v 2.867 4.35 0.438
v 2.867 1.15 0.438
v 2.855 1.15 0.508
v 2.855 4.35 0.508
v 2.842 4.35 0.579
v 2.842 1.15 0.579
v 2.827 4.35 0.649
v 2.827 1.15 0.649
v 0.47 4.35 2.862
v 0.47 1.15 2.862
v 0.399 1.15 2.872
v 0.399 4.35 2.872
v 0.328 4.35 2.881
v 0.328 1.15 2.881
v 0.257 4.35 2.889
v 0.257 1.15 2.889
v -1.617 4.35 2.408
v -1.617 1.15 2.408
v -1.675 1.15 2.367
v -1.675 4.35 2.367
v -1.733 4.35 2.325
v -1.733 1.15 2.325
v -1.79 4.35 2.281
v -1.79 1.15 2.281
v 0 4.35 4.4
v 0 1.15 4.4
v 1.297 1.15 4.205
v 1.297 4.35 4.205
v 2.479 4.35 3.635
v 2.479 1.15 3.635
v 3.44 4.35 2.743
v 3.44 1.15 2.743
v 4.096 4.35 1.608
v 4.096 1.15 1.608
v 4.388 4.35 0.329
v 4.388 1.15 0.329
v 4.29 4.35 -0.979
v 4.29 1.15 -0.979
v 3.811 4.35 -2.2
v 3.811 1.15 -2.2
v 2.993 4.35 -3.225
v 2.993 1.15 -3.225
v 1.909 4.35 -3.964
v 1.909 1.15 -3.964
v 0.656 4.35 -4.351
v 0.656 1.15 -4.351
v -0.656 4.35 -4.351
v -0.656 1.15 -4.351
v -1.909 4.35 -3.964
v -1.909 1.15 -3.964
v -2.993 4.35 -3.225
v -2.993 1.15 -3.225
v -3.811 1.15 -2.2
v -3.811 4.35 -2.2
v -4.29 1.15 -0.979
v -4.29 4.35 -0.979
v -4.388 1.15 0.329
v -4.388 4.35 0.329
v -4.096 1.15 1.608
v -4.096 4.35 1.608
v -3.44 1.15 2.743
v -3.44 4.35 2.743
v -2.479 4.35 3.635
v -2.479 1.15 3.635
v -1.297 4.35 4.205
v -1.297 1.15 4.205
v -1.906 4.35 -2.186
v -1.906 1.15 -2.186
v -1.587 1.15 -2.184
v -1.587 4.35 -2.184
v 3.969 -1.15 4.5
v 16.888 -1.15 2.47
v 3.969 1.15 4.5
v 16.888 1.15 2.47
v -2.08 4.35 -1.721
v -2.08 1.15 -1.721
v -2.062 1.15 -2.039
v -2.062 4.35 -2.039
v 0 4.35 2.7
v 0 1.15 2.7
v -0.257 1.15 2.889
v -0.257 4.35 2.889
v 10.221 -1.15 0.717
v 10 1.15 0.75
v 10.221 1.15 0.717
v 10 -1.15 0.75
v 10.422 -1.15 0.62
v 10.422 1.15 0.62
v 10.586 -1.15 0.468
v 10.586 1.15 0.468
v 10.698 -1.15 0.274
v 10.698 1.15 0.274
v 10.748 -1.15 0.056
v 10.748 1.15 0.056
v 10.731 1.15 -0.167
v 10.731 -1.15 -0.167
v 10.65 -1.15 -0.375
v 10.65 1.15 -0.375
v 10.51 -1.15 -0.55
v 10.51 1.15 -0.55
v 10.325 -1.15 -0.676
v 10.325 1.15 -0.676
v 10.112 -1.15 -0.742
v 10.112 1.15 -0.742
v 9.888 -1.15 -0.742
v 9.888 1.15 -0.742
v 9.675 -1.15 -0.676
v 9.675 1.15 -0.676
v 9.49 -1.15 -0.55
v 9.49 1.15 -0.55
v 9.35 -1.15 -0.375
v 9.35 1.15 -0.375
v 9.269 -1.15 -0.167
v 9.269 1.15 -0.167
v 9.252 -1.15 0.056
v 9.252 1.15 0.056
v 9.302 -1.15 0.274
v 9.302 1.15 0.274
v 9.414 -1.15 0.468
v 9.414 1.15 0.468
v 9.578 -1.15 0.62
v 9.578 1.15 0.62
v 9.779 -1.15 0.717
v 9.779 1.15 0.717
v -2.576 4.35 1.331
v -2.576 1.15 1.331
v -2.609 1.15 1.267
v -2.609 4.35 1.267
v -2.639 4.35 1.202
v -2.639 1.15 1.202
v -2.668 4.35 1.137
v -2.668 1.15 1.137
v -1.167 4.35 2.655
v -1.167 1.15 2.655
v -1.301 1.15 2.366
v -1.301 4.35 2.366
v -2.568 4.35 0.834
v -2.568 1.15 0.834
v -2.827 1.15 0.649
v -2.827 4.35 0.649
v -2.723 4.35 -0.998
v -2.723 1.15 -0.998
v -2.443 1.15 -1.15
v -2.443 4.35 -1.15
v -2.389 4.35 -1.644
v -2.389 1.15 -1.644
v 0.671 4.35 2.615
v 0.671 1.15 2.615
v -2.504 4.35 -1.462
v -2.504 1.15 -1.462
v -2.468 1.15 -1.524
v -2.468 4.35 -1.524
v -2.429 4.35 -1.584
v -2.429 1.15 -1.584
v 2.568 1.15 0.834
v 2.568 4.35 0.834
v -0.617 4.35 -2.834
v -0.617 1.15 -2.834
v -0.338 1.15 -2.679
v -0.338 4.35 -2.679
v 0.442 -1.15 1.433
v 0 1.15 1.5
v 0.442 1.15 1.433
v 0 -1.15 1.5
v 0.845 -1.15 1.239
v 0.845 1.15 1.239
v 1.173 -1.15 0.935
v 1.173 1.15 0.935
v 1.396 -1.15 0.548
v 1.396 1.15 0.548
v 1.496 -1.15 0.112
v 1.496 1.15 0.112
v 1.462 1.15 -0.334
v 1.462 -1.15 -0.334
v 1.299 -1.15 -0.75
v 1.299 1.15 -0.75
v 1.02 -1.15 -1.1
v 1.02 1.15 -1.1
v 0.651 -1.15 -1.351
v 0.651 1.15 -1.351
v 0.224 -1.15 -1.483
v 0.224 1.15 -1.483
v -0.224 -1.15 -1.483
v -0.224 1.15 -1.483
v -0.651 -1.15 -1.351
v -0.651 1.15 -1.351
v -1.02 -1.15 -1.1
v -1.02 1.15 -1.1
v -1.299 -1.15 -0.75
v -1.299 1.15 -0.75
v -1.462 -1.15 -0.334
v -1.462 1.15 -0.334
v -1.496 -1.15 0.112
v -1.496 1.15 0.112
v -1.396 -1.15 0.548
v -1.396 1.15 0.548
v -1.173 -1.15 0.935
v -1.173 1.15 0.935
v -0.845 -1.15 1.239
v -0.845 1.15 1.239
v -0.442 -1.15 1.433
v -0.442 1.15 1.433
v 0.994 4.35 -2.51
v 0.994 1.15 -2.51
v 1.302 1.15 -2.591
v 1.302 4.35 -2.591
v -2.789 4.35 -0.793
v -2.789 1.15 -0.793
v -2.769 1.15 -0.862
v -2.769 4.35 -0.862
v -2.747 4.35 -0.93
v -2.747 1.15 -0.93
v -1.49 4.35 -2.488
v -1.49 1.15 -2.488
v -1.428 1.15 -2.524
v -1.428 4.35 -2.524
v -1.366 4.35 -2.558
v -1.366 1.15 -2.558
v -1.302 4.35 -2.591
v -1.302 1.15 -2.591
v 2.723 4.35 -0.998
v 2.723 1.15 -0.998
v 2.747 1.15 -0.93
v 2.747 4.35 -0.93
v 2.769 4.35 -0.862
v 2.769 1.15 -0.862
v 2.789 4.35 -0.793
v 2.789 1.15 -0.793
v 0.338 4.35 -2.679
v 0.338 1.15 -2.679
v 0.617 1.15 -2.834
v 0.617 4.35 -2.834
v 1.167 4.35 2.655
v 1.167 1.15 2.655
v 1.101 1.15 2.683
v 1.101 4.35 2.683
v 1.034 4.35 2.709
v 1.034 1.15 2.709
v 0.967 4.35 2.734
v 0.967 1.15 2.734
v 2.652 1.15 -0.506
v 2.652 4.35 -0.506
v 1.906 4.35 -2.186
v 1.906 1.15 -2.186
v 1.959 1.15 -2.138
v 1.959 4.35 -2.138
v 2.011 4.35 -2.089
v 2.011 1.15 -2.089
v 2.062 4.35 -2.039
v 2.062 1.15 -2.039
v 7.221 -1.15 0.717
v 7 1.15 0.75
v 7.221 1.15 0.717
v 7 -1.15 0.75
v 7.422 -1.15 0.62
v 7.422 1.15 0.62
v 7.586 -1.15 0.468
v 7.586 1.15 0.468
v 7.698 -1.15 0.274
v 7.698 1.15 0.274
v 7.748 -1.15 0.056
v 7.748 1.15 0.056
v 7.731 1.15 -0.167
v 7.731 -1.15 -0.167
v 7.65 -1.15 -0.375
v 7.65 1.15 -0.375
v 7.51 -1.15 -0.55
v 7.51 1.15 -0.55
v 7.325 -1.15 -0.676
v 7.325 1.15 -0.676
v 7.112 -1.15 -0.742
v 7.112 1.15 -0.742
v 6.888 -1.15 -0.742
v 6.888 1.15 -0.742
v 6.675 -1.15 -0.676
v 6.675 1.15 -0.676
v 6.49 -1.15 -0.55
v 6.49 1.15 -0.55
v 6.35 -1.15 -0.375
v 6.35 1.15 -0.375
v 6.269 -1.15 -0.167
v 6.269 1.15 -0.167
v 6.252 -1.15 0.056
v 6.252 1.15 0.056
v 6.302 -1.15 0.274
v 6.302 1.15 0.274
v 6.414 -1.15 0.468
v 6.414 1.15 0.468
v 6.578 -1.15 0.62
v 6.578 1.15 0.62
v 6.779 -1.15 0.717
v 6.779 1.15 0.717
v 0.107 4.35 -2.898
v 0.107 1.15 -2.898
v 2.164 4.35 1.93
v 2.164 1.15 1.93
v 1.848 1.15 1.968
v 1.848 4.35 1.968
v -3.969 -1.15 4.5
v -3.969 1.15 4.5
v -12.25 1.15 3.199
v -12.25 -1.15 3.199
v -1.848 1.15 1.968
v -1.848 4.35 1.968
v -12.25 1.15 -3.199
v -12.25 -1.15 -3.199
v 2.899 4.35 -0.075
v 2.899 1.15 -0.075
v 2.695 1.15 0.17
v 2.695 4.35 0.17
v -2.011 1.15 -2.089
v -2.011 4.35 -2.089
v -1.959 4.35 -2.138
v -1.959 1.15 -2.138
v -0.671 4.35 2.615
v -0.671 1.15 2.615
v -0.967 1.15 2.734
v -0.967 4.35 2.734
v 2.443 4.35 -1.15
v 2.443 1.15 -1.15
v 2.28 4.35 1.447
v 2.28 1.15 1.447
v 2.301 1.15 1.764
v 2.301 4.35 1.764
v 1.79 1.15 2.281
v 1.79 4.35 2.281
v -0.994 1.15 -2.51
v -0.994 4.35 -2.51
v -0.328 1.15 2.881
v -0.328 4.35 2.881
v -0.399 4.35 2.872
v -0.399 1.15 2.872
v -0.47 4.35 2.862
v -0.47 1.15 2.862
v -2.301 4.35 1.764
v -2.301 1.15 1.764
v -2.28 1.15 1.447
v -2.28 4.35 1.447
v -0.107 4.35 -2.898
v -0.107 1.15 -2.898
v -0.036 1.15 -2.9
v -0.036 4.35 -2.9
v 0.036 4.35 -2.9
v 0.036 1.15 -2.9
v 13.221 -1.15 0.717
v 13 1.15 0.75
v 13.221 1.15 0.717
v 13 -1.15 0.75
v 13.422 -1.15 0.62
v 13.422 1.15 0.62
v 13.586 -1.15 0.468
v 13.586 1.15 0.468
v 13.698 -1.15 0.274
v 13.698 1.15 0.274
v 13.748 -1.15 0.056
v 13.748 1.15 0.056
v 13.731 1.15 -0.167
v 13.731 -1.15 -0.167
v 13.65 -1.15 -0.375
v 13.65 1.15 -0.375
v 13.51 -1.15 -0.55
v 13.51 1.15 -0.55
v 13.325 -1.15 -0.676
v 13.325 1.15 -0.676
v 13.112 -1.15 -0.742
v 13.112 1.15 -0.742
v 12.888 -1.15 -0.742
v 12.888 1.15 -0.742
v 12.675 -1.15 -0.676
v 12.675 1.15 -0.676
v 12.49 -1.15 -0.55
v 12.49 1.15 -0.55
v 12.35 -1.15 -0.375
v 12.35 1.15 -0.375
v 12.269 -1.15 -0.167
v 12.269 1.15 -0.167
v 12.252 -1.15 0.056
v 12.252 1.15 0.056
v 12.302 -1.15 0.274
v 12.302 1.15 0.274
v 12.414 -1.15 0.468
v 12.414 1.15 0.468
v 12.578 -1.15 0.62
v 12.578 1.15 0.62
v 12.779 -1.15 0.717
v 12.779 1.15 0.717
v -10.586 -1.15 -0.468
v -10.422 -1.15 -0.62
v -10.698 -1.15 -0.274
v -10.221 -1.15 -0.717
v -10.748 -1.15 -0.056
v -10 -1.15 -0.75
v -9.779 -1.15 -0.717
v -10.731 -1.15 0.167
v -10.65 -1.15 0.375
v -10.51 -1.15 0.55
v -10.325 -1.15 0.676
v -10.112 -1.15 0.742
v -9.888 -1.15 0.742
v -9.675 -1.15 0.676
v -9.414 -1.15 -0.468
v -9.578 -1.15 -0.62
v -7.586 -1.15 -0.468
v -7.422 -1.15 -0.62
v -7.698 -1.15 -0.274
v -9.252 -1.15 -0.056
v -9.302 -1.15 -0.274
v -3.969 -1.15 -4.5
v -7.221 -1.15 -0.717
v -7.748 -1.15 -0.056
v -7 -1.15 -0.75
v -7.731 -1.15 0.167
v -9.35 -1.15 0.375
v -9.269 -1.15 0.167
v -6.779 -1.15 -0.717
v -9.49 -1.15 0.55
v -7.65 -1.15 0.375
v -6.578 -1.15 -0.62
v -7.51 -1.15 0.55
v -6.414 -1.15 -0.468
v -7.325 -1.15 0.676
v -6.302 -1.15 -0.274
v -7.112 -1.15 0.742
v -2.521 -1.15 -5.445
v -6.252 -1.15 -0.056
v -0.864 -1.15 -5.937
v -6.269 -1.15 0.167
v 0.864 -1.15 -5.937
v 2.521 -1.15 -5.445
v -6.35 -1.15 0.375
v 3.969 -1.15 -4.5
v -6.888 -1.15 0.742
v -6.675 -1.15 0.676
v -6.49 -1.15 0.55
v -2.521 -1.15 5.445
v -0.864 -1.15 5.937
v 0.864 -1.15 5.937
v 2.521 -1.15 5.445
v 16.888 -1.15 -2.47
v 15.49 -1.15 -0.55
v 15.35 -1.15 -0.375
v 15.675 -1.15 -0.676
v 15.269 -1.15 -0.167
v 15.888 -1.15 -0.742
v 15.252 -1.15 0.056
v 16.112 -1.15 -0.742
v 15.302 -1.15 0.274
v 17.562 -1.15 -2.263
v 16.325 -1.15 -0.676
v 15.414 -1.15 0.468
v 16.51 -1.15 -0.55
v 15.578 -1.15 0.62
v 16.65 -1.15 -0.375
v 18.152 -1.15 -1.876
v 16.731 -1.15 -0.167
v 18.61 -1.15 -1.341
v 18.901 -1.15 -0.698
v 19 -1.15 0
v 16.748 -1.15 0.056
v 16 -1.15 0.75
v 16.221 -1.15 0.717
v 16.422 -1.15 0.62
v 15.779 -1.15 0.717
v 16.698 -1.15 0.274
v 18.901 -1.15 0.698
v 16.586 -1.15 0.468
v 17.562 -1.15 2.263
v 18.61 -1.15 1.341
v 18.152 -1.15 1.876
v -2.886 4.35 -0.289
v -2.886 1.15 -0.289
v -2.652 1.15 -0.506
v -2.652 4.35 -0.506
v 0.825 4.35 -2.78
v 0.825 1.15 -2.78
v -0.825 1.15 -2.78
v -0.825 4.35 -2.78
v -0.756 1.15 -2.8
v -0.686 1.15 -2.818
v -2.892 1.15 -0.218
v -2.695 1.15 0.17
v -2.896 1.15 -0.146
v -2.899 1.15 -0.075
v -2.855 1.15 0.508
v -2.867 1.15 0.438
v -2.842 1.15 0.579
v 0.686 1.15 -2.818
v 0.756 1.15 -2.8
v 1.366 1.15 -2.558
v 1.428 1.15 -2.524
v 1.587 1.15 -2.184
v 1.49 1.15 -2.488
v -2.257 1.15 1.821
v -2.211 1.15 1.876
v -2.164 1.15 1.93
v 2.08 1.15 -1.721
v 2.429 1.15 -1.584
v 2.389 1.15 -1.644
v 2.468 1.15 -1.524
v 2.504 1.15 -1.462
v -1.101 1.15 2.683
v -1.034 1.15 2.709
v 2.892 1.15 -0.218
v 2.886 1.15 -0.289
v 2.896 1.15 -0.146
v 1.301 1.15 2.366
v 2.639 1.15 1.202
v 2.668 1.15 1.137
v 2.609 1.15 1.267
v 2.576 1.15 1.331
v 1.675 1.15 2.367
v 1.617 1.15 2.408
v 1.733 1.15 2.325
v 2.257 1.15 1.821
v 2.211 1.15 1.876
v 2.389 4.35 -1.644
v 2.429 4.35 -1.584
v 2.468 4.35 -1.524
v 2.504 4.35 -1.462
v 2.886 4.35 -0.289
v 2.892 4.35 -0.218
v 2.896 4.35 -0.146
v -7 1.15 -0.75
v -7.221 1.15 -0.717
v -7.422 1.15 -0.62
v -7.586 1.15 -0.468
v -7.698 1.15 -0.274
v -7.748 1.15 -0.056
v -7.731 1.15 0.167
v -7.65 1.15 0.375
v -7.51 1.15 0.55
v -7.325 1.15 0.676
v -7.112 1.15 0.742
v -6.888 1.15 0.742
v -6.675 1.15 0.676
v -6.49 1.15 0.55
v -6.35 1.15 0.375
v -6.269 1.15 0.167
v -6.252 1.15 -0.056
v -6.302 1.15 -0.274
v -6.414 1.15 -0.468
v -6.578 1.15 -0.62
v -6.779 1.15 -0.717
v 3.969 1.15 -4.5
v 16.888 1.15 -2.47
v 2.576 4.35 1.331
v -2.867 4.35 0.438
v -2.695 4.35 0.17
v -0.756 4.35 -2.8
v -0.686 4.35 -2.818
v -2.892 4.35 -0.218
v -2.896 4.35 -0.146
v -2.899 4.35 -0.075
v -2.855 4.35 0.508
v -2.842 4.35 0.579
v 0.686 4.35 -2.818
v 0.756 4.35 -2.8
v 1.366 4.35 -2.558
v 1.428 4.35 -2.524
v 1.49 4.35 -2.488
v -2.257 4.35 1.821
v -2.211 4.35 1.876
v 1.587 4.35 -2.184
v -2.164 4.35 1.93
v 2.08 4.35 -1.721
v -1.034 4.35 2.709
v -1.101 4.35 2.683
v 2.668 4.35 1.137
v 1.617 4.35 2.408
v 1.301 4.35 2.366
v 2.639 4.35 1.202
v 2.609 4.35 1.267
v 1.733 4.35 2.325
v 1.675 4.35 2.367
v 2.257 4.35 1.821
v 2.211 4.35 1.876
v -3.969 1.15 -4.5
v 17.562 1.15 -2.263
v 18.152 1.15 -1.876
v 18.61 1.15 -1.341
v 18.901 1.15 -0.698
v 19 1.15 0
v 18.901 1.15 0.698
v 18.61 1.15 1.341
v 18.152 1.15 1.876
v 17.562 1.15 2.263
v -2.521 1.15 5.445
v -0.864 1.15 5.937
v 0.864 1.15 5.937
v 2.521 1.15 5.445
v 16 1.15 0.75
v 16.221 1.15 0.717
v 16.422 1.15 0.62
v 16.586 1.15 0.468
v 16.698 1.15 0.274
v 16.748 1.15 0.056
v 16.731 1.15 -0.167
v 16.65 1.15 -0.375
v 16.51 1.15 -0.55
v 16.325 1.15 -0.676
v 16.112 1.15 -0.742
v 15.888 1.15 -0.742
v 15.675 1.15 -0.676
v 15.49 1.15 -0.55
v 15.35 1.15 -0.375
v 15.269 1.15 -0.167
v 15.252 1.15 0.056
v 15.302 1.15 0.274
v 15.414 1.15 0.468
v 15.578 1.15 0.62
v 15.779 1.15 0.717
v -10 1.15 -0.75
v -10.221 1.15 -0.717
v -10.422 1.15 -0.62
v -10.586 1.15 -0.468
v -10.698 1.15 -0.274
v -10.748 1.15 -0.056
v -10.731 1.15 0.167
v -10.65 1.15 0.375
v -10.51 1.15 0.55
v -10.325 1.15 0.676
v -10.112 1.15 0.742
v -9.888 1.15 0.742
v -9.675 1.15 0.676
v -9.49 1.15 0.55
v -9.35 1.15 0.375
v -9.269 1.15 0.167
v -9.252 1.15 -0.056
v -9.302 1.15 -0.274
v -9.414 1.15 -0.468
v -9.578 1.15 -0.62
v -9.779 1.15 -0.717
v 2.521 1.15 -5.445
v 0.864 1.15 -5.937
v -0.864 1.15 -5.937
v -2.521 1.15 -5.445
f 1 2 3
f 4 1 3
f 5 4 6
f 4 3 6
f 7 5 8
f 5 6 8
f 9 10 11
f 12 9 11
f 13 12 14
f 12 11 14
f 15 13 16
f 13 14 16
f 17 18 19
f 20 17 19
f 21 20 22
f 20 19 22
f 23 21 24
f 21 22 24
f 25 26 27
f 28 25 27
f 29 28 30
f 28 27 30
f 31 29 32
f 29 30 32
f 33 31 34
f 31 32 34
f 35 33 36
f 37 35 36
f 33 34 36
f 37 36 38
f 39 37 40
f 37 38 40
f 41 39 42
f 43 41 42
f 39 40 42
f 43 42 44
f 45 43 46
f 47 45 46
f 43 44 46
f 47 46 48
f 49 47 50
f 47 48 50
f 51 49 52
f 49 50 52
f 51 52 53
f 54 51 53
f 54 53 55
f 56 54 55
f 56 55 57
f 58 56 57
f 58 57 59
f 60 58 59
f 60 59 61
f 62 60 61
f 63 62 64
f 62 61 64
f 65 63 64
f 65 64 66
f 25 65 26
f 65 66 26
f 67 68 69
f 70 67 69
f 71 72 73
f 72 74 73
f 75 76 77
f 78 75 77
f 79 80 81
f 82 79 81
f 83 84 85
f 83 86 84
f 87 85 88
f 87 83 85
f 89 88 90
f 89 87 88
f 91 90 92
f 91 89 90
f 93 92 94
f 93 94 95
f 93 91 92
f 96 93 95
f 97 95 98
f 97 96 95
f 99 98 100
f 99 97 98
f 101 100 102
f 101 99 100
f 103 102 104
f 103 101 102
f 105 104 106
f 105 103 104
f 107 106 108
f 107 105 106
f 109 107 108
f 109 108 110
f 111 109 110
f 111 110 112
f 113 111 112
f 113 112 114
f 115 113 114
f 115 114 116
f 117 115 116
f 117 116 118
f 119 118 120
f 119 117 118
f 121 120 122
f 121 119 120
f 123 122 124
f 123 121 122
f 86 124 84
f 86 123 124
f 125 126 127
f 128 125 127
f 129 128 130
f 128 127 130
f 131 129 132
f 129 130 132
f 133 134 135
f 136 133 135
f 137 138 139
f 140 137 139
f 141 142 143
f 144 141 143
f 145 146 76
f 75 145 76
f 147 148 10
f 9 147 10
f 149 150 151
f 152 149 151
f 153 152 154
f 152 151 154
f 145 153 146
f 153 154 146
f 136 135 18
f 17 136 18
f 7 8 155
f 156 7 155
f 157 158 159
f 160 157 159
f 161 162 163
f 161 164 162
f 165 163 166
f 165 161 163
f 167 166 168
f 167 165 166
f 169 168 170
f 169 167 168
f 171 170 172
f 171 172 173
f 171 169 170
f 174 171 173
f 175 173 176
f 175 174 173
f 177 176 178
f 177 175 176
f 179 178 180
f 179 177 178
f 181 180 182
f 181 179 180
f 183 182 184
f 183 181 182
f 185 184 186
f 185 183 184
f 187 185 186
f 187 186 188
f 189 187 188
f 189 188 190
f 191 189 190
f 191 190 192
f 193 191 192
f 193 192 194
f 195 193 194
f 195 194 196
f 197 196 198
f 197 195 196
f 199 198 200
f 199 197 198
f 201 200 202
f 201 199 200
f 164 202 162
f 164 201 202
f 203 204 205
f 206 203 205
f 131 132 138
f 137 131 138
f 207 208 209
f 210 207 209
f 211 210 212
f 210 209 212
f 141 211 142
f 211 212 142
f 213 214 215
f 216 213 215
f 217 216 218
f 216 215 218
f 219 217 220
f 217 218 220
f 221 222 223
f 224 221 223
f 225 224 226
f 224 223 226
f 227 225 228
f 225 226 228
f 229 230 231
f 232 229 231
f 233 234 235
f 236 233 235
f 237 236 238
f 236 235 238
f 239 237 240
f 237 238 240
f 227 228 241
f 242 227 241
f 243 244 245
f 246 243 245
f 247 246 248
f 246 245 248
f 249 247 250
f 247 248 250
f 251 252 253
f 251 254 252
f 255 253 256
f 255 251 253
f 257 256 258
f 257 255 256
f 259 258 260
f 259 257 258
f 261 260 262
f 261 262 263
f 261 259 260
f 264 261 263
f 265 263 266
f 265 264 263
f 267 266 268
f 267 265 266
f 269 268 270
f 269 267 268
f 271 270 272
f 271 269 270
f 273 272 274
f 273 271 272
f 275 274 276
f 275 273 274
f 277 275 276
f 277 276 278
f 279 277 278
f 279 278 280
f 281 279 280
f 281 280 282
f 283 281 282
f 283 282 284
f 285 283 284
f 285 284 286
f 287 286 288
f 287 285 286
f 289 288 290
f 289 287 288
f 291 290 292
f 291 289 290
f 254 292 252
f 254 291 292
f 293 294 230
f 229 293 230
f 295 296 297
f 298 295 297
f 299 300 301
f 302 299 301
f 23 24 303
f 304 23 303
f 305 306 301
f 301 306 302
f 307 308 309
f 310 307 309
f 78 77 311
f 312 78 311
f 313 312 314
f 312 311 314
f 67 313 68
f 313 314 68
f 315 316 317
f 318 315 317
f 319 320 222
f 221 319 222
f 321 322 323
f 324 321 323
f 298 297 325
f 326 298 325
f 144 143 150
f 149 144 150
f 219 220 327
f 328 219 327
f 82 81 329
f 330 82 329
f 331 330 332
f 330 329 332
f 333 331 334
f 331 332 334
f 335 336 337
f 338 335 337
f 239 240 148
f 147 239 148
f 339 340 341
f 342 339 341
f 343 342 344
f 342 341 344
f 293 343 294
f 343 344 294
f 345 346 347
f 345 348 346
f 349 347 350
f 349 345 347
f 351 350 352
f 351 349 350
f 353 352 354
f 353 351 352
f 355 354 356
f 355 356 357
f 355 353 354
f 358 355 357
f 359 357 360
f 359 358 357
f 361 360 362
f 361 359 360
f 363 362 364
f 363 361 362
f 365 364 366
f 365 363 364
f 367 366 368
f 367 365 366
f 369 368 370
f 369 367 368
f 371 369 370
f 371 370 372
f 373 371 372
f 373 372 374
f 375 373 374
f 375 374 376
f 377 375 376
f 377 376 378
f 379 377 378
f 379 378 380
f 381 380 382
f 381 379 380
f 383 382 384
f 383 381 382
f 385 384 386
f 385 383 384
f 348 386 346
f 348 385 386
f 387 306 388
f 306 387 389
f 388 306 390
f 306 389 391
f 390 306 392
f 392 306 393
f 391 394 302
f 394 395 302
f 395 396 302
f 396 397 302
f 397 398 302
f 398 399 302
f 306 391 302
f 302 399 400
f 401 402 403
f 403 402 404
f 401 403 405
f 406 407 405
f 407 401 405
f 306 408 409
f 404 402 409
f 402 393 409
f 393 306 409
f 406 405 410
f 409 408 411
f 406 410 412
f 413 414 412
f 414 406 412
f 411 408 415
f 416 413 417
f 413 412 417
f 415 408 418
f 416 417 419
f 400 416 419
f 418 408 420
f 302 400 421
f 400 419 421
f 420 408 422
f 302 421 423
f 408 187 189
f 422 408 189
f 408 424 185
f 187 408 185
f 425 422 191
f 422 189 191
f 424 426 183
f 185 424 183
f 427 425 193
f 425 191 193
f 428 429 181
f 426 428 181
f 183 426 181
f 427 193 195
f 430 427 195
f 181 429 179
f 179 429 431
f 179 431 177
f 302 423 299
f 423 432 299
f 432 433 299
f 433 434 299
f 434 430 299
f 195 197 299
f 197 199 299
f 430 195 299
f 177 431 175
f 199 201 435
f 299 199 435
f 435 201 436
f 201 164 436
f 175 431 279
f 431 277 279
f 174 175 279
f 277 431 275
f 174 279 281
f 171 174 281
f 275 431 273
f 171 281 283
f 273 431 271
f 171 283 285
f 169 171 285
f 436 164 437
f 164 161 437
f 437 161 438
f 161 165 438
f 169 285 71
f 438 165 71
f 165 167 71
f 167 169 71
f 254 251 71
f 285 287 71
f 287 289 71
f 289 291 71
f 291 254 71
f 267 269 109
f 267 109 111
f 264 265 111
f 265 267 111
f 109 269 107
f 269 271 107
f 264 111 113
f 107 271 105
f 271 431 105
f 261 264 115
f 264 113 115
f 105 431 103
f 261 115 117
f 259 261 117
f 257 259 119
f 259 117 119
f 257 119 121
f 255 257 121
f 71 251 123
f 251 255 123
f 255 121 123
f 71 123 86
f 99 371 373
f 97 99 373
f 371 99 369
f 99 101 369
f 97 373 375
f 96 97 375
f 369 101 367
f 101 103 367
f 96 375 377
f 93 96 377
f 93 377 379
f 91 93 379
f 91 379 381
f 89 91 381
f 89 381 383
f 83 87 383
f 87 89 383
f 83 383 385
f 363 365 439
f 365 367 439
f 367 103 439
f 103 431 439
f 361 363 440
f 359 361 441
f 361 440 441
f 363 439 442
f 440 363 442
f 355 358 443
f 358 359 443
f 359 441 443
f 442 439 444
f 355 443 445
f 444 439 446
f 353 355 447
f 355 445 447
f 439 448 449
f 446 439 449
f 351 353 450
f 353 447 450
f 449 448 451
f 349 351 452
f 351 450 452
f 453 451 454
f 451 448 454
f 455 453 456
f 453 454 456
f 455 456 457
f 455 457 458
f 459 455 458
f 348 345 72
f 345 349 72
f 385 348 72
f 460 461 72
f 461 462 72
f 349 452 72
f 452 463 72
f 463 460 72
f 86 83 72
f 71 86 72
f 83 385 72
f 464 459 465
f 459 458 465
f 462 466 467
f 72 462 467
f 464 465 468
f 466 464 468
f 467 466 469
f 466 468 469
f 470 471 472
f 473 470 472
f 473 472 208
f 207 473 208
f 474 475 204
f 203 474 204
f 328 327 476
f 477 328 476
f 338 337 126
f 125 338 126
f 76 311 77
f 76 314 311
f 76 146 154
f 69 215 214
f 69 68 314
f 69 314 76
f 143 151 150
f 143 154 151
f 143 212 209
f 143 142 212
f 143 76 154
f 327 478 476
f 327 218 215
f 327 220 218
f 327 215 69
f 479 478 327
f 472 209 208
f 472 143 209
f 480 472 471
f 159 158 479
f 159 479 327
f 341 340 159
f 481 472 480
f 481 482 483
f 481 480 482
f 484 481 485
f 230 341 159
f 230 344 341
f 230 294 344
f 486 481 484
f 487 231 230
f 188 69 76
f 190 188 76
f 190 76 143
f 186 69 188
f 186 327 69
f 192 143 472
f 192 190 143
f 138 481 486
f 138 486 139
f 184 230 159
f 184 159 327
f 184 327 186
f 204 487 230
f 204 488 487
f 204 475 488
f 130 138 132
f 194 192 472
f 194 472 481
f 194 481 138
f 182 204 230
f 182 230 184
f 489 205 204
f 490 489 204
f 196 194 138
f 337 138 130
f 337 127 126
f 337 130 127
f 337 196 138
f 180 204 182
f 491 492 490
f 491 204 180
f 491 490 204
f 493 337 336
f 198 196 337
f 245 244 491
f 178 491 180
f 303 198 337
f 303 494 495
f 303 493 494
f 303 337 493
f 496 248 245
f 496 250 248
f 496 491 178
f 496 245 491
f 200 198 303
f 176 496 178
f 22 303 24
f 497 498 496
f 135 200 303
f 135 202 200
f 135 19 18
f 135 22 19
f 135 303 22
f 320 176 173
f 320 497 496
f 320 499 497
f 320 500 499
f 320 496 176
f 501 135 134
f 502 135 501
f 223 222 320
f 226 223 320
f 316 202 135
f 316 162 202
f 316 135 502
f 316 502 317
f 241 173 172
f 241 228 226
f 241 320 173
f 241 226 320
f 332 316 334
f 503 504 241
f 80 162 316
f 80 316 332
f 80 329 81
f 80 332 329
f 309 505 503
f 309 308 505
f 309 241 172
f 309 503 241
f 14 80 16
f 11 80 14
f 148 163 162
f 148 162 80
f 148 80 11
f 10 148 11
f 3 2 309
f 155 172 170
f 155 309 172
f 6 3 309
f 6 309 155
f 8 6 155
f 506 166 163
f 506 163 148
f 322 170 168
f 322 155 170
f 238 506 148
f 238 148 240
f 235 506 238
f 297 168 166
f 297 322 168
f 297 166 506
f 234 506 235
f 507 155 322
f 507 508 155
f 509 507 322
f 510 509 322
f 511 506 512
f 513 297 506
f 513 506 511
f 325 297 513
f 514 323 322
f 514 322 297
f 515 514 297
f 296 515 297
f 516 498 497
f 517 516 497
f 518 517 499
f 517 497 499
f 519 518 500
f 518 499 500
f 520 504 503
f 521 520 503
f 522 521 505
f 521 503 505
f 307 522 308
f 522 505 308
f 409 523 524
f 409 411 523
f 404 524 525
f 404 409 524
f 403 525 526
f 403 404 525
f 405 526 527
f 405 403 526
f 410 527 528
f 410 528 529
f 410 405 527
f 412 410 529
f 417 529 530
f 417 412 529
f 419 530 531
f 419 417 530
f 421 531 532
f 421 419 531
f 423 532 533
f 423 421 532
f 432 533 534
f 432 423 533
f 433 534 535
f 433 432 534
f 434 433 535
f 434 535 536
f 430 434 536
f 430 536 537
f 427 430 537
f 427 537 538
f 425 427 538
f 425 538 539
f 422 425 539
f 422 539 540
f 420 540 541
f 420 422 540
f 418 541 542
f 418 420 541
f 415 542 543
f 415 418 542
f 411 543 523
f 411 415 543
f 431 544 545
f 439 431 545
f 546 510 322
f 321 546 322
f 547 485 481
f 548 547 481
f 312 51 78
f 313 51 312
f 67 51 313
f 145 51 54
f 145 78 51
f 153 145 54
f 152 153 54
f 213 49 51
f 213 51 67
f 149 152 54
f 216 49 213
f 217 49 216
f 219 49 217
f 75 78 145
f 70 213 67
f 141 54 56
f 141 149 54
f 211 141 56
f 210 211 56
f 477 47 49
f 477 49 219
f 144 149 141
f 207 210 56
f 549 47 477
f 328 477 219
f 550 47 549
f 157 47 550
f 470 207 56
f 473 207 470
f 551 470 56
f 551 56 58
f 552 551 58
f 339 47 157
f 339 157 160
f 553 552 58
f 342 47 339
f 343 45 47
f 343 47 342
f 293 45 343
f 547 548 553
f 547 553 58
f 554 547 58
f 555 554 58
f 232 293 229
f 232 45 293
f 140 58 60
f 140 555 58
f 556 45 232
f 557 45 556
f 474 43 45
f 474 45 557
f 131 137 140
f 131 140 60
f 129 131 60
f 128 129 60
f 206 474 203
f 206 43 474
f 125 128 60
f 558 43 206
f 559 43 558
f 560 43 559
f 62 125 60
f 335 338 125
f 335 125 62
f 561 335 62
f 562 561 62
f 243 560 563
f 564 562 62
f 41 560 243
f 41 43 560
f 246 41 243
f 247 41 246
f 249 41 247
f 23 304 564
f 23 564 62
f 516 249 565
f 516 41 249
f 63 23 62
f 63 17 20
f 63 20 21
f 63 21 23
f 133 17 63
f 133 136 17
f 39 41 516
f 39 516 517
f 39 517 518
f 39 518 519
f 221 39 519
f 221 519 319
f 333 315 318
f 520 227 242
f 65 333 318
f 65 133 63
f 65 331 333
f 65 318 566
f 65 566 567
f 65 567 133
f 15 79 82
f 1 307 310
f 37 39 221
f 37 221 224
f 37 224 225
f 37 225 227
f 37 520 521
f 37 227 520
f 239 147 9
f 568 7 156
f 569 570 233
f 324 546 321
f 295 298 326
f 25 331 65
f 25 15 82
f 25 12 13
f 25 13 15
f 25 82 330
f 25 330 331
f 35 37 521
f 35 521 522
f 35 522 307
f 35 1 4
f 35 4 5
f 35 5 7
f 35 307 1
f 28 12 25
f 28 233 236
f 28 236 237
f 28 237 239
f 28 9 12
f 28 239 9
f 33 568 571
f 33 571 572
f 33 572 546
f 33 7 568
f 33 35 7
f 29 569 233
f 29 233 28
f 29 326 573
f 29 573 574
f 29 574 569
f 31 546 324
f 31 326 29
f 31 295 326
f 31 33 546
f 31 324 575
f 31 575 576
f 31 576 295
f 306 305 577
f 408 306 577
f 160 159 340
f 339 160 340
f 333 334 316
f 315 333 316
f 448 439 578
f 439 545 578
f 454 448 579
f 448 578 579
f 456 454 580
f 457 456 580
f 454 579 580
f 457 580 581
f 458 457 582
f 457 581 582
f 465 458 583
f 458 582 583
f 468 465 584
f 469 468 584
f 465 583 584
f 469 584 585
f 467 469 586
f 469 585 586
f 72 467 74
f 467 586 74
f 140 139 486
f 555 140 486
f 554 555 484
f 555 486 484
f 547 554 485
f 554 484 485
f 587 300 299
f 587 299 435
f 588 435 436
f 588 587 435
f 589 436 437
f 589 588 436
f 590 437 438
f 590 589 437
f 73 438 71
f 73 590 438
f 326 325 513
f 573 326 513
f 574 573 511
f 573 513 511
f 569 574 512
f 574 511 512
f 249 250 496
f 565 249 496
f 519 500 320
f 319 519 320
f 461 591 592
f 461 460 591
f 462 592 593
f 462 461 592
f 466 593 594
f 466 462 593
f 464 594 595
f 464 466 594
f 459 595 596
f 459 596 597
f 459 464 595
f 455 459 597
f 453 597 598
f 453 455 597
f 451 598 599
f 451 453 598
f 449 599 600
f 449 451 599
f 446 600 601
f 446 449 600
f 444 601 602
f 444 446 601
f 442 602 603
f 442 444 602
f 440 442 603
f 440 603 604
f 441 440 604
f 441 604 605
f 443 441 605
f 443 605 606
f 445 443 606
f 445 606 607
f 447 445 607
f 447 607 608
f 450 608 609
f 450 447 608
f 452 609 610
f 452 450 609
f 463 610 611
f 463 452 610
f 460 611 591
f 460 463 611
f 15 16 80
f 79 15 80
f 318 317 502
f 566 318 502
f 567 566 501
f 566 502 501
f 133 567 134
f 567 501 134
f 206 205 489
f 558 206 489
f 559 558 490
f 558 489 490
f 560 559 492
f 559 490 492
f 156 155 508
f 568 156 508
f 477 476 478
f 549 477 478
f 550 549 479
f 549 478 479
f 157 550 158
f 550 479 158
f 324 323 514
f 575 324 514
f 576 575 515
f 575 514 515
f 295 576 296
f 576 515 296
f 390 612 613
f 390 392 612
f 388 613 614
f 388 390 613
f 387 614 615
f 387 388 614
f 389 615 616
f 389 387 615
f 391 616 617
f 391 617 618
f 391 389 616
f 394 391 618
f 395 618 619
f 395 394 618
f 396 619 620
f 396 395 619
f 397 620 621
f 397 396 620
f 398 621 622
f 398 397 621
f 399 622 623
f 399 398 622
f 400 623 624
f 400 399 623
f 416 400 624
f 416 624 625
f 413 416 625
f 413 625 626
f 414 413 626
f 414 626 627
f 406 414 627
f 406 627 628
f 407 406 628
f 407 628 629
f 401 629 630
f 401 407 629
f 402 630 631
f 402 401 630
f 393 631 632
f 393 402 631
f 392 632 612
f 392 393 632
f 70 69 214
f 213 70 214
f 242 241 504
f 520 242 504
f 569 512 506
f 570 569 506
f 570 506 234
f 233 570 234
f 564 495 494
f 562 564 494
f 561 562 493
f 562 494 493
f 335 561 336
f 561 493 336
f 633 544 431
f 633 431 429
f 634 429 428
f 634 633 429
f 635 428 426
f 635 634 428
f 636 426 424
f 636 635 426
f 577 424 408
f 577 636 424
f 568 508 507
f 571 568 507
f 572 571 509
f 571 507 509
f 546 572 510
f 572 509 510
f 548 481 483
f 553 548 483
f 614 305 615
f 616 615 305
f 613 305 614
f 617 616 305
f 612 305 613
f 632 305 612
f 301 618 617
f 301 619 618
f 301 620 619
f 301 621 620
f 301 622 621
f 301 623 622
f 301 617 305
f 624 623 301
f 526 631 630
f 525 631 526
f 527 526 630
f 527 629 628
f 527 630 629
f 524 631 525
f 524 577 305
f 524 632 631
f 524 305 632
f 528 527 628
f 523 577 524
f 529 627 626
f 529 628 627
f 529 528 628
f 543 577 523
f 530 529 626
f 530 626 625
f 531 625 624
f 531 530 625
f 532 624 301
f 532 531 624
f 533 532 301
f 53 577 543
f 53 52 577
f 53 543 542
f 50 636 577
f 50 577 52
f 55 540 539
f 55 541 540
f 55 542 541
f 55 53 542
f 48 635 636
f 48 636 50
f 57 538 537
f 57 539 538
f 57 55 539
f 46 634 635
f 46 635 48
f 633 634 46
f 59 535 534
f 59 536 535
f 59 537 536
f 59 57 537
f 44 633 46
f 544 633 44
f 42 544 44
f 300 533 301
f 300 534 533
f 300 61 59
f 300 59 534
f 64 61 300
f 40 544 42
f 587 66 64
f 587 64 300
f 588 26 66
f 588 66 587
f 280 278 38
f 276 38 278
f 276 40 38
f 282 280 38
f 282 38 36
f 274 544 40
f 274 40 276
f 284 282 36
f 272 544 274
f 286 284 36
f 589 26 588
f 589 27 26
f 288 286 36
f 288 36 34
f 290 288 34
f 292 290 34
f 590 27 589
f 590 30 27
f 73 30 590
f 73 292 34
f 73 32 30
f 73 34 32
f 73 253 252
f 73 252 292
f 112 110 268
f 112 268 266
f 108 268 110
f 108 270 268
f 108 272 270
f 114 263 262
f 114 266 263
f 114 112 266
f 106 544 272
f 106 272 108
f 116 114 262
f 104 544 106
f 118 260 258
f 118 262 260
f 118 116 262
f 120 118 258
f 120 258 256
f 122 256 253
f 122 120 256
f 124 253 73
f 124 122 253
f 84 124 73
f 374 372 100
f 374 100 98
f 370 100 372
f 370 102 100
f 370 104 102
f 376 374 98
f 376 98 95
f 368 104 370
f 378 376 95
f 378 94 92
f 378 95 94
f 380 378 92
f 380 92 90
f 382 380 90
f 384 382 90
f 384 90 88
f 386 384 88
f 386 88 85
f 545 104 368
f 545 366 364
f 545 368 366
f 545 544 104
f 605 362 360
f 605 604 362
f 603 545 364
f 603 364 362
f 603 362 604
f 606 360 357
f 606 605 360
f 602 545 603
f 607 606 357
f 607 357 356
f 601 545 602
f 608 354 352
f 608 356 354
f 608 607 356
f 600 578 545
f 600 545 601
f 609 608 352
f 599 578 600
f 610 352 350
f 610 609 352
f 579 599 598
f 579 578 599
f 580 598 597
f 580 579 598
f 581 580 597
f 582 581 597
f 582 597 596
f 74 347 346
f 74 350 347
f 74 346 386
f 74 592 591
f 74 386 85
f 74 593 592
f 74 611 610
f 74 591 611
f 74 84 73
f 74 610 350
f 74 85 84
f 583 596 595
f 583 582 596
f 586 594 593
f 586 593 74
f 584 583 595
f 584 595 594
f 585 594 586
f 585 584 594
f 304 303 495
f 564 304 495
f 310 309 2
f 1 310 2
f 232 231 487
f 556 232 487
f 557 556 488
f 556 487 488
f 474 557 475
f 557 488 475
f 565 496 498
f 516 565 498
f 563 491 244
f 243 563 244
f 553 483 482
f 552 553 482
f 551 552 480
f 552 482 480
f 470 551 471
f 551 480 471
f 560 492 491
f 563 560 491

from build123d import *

# Parameters (mm, degrees)
SKETCH2_R           = 6
SKETCH2_R_2         = 1.5
BOSS_EXTRUDE1_DEPTH = 1.15
SKETCH3_R           = 4.4
BOSS_EXTRUDE2_DEPTH = 3.2
SKETCH4_R           = 0.75
BOSS_EXTRUDE3_DEPTH = 1.15
CIRPATTERN1_COUNT   = 2
CUT_EXTRUDE1_DEPTH  = 10


with BuildPart() as part:
    # Sketch2 → Boss-Extrude1 (new, symmetric)
    with BuildSketch(Plane(origin=(0, 0, 0), x_dir=(1, 0, 0), z_dir=(0, 1, 0))):
        with Locations(Location((0, 0, 0), (0, 0, 270))):
            Circle(SKETCH2_R)
        with Locations(Location((0, 0, 0), (0, 0, 270))):
            Circle(SKETCH2_R_2, mode=Mode.SUBTRACT)
    extrude(amount=BOSS_EXTRUDE1_DEPTH, both=True)

    # Sketch3 → Boss-Extrude2 (add)
    with BuildSketch(Plane(origin=(0, 1.15, 0), x_dir=(1, 0, 0), z_dir=(0, 1, 0))):
        with Locations(Location((0, 0, 0), (0, 0, 270))):
            Circle(SKETCH3_R)
        with BuildLine():
            Line((0.107421435, 2.898009771), (0.338399731, 2.678709694))
            Line((0.338399731, 2.678709694), (0.61665913, 2.83367809))
            ThreePointArc((0.61665913, 2.83367809), (0.721200673, 2.808891167), (0.824752316, 2.780248841))
            Line((0.824752316, 2.780248841), (0.993936292, 2.510396512))
            Line((0.993936292, 2.510396512), (1.301992734, 2.591295993))
            ThreePointArc((1.301992734, 2.591295993), (1.397085655, 2.541289372), (1.490260976, 2.48779465))
            Line((1.490260976, 2.48779465), (1.587020181, 2.184345885))
            Line((1.587020181, 2.184345885), (1.905517346, 2.186093238))
            ThreePointArc((1.905517346, 2.186093238), (1.985186607, 2.11400902), (2.062131058, 2.039023173))
            Line((2.062131058, 2.039023173), (2.080385755, 1.721044772))
            Line((2.080385755, 1.721044772), (2.389311295, 1.643530205))
            ThreePointArc((2.389311295, 1.643530205), (2.448550984, 1.553897705), (2.504429862, 1.46213237))
            Line((2.504429862, 1.46213237), (2.443033042, 1.149604087))
            Line((2.443033042, 1.149604087), (2.722976028, 0.997698125))
            ThreePointArc((2.722976028, 0.997698125), (2.758063897, 0.896149284), (2.789366126, 0.793370413))
            Line((2.789366126, 0.793370413), (2.652175577, 0.505929549))
            Line((2.652175577, 0.505929549), (2.885546163, 0.289177003))
            ThreePointArc((2.885546163, 0.289177003), (2.894277512, 0.182092507), (2.899036259, 0.074758075))
            Line((2.899036259, 0.074758075), (2.694672167, -0.169534403))
            Line((2.694672167, -0.169534403), (2.866806821, -0.437514174))
            ThreePointArc((2.866806821, -0.437514174), (2.848633027, -0.543405812), (2.826549281, -0.648551587))
            Line((2.826549281, -0.648551587), (2.567852594, -0.834345885))
            Line((2.567852594, -0.834345885), (2.667935462, -1.136714727))
            ThreePointArc((2.667935462, -1.136714727), (2.623998452, -1.234759946), (2.576459817, -1.331110368))
            Line((2.576459817, -1.331110368), (2.279685399, -1.446732346))
            Line((2.279685399, -1.446732346), (2.301427906, -1.764491312))
            ThreePointArc((2.301427906, -1.764491312), (2.234488404, -1.84852957), (2.164481907, -1.930030589))
            Line((2.164481907, -1.930030589), (1.848277186, -1.968215294))
            Line((1.848277186, -1.968215294), (1.790313171, -2.281398419))
            ThreePointArc((1.790313171, -2.281398419), (1.704577232, -2.346149284), (1.616501638, -2.40767989))
            Line((1.616501638, -2.40767989), (1.30073492, -2.366028036))
            Line((1.30073492, -2.366028036), (1.166706475, -2.654956874))
            ThreePointArc((1.166706475, -2.654956874), (1.067561203, -2.696351809), (0.966950626, -2.734045809))
            Line((0.966950626, -2.734045809), (0.671462695, -2.615174535))
            Line((0.671462695, -2.615174535), (0.469791321, -2.861694623))
            ThreePointArc((0.469791321, -2.861694623), (0.363466377, -2.877132634), (0.25664255, -2.888621575))
            Line((0.25664255, -2.888621575), (0, -2.7))
            Line((0, -2.7), (-0.25664255, -2.888621575))
            ThreePointArc((-0.25664255, -2.888621575), (-0.363466377, -2.877132634), (-0.469791321, -2.861694623))
            Line((-0.469791321, -2.861694623), (-0.671462695, -2.615174535))
            Line((-0.671462695, -2.615174535), (-0.966950626, -2.734045809))
            ThreePointArc((-0.966950626, -2.734045809), (-1.067561203, -2.696351809), (-1.166706475, -2.654956874))
            Line((-1.166706475, -2.654956874), (-1.30073492, -2.366028036))
            Line((-1.30073492, -2.366028036), (-1.616501638, -2.40767989))
            ThreePointArc((-1.616501638, -2.40767989), (-1.704577232, -2.346149284), (-1.790313171, -2.281398419))
            Line((-1.790313171, -2.281398419), (-1.848277186, -1.968215294))
            Line((-1.848277186, -1.968215294), (-2.164481907, -1.930030589))
            ThreePointArc((-2.164481907, -1.930030589), (-2.234488404, -1.84852957), (-2.301427906, -1.764491312))
            Line((-2.301427906, -1.764491312), (-2.279685399, -1.446732346))
            Line((-2.279685399, -1.446732346), (-2.576459817, -1.331110368))
            ThreePointArc((-2.576459817, -1.331110368), (-2.623998452, -1.234759946), (-2.667935462, -1.136714727))
            Line((-2.667935462, -1.136714727), (-2.567852594, -0.834345885))
            Line((-2.567852594, -0.834345885), (-2.826549281, -0.648551587))
            ThreePointArc((-2.826549281, -0.648551587), (-2.848633027, -0.543405812), (-2.866806821, -0.437514174))
            Line((-2.866806821, -0.437514174), (-2.694672167, -0.169534403))
            Line((-2.694672167, -0.169534403), (-2.899036259, 0.074758075))
            ThreePointArc((-2.899036259, 0.074758075), (-2.894277512, 0.182092507), (-2.885546163, 0.289177003))
            Line((-2.885546163, 0.289177003), (-2.652175577, 0.505929549))
            Line((-2.652175577, 0.505929549), (-2.789366126, 0.793370413))
            ThreePointArc((-2.789366126, 0.793370413), (-2.758063897, 0.896149284), (-2.722976028, 0.997698125))
            Line((-2.722976028, 0.997698125), (-2.443033042, 1.149604087))
            Line((-2.443033042, 1.149604087), (-2.504429862, 1.46213237))
            ThreePointArc((-2.504429862, 1.46213237), (-2.448550984, 1.553897705), (-2.389311295, 1.643530205))
            Line((-2.389311295, 1.643530205), (-2.080385755, 1.721044772))
            Line((-2.080385755, 1.721044772), (-2.062131058, 2.039023173))
            ThreePointArc((-2.062131058, 2.039023173), (-1.985186607, 2.11400902), (-1.905517346, 2.186093238))
            Line((-1.905517346, 2.186093238), (-1.587020181, 2.184345885))
            Line((-1.587020181, 2.184345885), (-1.490260976, 2.48779465))
            ThreePointArc((-1.490260976, 2.48779465), (-1.397085655, 2.541289372), (-1.301992734, 2.591295993))
            Line((-1.301992734, 2.591295993), (-0.993936292, 2.510396512))
            Line((-0.993936292, 2.510396512), (-0.824752316, 2.780248841))
            ThreePointArc((-0.824752316, 2.780248841), (-0.721200673, 2.808891167), (-0.61665913, 2.83367809))
            Line((-0.61665913, 2.83367809), (-0.338399731, 2.678709694))
            Line((-0.338399731, 2.678709694), (-0.107421435, 2.898009771))
            ThreePointArc((-0.107421435, 2.898009771), (0, 2.9), (0.107421435, 2.898009771))
        make_face(mode=Mode.SUBTRACT)
    extrude(amount=BOSS_EXTRUDE2_DEPTH)

    # Sketch4 → Boss-Extrude3 (add, symmetric)
    with BuildSketch(Plane(origin=(0, 0, 0), x_dir=(1, 0, 0), z_dir=(0, 1, 0))):
        with BuildLine():
            Line((3.968626967, 4.5), (16.888114198, 2.469689731))
            ThreePointArc((16.888114198, 2.469689731), (19, 0), (16.888114198, -2.469689731))
            Line((16.888114198, -2.469689731), (3.968626967, -4.5))
            ThreePointArc((3.968626967, -4.5), (6, 0), (3.968626967, 4.5))
        make_face()
        with Locations(Location((16, 0, 0), (0, 0, 270))):
            Circle(SKETCH4_R, mode=Mode.SUBTRACT)
        with Locations(Location((13, 0, 0), (0, 0, 270))):
            Circle(SKETCH4_R, mode=Mode.SUBTRACT)
        with Locations(Location((10, 0, 0), (0, 0, 270))):
            Circle(SKETCH4_R, mode=Mode.SUBTRACT)
        with Locations(Location((7, 0, 0), (0, 0, 270))):
            Circle(SKETCH4_R, mode=Mode.SUBTRACT)
    boss_extrude3 = extrude(amount=BOSS_EXTRUDE3_DEPTH, both=True)

    # CirPattern1: Boss-Extrude3 ×2 about axis
    cirpattern1_axis = Axis((0, 0, 0), (0, 1, 0))
    for i in range(1, CIRPATTERN1_COUNT):
        add(boss_extrude3.rotate(cirpattern1_axis, i * 360 / CIRPATTERN1_COUNT))

    # Sketch6 → Cut-Extrude1 (cut)
    with BuildSketch(Plane.XZ.offset(1.15)):
        Polygon((-12.25, 0), (-12.25, 5.932687926), (-21.293207436, 5.932687926), (-21.293207436, 0), (-21.293207436, -7.371619722), (-12.25, -7.371619722), align=None)
    extrude(amount=-CUT_EXTRUDE1_DEPTH, mode=Mode.SUBTRACT)


solid = part.part
